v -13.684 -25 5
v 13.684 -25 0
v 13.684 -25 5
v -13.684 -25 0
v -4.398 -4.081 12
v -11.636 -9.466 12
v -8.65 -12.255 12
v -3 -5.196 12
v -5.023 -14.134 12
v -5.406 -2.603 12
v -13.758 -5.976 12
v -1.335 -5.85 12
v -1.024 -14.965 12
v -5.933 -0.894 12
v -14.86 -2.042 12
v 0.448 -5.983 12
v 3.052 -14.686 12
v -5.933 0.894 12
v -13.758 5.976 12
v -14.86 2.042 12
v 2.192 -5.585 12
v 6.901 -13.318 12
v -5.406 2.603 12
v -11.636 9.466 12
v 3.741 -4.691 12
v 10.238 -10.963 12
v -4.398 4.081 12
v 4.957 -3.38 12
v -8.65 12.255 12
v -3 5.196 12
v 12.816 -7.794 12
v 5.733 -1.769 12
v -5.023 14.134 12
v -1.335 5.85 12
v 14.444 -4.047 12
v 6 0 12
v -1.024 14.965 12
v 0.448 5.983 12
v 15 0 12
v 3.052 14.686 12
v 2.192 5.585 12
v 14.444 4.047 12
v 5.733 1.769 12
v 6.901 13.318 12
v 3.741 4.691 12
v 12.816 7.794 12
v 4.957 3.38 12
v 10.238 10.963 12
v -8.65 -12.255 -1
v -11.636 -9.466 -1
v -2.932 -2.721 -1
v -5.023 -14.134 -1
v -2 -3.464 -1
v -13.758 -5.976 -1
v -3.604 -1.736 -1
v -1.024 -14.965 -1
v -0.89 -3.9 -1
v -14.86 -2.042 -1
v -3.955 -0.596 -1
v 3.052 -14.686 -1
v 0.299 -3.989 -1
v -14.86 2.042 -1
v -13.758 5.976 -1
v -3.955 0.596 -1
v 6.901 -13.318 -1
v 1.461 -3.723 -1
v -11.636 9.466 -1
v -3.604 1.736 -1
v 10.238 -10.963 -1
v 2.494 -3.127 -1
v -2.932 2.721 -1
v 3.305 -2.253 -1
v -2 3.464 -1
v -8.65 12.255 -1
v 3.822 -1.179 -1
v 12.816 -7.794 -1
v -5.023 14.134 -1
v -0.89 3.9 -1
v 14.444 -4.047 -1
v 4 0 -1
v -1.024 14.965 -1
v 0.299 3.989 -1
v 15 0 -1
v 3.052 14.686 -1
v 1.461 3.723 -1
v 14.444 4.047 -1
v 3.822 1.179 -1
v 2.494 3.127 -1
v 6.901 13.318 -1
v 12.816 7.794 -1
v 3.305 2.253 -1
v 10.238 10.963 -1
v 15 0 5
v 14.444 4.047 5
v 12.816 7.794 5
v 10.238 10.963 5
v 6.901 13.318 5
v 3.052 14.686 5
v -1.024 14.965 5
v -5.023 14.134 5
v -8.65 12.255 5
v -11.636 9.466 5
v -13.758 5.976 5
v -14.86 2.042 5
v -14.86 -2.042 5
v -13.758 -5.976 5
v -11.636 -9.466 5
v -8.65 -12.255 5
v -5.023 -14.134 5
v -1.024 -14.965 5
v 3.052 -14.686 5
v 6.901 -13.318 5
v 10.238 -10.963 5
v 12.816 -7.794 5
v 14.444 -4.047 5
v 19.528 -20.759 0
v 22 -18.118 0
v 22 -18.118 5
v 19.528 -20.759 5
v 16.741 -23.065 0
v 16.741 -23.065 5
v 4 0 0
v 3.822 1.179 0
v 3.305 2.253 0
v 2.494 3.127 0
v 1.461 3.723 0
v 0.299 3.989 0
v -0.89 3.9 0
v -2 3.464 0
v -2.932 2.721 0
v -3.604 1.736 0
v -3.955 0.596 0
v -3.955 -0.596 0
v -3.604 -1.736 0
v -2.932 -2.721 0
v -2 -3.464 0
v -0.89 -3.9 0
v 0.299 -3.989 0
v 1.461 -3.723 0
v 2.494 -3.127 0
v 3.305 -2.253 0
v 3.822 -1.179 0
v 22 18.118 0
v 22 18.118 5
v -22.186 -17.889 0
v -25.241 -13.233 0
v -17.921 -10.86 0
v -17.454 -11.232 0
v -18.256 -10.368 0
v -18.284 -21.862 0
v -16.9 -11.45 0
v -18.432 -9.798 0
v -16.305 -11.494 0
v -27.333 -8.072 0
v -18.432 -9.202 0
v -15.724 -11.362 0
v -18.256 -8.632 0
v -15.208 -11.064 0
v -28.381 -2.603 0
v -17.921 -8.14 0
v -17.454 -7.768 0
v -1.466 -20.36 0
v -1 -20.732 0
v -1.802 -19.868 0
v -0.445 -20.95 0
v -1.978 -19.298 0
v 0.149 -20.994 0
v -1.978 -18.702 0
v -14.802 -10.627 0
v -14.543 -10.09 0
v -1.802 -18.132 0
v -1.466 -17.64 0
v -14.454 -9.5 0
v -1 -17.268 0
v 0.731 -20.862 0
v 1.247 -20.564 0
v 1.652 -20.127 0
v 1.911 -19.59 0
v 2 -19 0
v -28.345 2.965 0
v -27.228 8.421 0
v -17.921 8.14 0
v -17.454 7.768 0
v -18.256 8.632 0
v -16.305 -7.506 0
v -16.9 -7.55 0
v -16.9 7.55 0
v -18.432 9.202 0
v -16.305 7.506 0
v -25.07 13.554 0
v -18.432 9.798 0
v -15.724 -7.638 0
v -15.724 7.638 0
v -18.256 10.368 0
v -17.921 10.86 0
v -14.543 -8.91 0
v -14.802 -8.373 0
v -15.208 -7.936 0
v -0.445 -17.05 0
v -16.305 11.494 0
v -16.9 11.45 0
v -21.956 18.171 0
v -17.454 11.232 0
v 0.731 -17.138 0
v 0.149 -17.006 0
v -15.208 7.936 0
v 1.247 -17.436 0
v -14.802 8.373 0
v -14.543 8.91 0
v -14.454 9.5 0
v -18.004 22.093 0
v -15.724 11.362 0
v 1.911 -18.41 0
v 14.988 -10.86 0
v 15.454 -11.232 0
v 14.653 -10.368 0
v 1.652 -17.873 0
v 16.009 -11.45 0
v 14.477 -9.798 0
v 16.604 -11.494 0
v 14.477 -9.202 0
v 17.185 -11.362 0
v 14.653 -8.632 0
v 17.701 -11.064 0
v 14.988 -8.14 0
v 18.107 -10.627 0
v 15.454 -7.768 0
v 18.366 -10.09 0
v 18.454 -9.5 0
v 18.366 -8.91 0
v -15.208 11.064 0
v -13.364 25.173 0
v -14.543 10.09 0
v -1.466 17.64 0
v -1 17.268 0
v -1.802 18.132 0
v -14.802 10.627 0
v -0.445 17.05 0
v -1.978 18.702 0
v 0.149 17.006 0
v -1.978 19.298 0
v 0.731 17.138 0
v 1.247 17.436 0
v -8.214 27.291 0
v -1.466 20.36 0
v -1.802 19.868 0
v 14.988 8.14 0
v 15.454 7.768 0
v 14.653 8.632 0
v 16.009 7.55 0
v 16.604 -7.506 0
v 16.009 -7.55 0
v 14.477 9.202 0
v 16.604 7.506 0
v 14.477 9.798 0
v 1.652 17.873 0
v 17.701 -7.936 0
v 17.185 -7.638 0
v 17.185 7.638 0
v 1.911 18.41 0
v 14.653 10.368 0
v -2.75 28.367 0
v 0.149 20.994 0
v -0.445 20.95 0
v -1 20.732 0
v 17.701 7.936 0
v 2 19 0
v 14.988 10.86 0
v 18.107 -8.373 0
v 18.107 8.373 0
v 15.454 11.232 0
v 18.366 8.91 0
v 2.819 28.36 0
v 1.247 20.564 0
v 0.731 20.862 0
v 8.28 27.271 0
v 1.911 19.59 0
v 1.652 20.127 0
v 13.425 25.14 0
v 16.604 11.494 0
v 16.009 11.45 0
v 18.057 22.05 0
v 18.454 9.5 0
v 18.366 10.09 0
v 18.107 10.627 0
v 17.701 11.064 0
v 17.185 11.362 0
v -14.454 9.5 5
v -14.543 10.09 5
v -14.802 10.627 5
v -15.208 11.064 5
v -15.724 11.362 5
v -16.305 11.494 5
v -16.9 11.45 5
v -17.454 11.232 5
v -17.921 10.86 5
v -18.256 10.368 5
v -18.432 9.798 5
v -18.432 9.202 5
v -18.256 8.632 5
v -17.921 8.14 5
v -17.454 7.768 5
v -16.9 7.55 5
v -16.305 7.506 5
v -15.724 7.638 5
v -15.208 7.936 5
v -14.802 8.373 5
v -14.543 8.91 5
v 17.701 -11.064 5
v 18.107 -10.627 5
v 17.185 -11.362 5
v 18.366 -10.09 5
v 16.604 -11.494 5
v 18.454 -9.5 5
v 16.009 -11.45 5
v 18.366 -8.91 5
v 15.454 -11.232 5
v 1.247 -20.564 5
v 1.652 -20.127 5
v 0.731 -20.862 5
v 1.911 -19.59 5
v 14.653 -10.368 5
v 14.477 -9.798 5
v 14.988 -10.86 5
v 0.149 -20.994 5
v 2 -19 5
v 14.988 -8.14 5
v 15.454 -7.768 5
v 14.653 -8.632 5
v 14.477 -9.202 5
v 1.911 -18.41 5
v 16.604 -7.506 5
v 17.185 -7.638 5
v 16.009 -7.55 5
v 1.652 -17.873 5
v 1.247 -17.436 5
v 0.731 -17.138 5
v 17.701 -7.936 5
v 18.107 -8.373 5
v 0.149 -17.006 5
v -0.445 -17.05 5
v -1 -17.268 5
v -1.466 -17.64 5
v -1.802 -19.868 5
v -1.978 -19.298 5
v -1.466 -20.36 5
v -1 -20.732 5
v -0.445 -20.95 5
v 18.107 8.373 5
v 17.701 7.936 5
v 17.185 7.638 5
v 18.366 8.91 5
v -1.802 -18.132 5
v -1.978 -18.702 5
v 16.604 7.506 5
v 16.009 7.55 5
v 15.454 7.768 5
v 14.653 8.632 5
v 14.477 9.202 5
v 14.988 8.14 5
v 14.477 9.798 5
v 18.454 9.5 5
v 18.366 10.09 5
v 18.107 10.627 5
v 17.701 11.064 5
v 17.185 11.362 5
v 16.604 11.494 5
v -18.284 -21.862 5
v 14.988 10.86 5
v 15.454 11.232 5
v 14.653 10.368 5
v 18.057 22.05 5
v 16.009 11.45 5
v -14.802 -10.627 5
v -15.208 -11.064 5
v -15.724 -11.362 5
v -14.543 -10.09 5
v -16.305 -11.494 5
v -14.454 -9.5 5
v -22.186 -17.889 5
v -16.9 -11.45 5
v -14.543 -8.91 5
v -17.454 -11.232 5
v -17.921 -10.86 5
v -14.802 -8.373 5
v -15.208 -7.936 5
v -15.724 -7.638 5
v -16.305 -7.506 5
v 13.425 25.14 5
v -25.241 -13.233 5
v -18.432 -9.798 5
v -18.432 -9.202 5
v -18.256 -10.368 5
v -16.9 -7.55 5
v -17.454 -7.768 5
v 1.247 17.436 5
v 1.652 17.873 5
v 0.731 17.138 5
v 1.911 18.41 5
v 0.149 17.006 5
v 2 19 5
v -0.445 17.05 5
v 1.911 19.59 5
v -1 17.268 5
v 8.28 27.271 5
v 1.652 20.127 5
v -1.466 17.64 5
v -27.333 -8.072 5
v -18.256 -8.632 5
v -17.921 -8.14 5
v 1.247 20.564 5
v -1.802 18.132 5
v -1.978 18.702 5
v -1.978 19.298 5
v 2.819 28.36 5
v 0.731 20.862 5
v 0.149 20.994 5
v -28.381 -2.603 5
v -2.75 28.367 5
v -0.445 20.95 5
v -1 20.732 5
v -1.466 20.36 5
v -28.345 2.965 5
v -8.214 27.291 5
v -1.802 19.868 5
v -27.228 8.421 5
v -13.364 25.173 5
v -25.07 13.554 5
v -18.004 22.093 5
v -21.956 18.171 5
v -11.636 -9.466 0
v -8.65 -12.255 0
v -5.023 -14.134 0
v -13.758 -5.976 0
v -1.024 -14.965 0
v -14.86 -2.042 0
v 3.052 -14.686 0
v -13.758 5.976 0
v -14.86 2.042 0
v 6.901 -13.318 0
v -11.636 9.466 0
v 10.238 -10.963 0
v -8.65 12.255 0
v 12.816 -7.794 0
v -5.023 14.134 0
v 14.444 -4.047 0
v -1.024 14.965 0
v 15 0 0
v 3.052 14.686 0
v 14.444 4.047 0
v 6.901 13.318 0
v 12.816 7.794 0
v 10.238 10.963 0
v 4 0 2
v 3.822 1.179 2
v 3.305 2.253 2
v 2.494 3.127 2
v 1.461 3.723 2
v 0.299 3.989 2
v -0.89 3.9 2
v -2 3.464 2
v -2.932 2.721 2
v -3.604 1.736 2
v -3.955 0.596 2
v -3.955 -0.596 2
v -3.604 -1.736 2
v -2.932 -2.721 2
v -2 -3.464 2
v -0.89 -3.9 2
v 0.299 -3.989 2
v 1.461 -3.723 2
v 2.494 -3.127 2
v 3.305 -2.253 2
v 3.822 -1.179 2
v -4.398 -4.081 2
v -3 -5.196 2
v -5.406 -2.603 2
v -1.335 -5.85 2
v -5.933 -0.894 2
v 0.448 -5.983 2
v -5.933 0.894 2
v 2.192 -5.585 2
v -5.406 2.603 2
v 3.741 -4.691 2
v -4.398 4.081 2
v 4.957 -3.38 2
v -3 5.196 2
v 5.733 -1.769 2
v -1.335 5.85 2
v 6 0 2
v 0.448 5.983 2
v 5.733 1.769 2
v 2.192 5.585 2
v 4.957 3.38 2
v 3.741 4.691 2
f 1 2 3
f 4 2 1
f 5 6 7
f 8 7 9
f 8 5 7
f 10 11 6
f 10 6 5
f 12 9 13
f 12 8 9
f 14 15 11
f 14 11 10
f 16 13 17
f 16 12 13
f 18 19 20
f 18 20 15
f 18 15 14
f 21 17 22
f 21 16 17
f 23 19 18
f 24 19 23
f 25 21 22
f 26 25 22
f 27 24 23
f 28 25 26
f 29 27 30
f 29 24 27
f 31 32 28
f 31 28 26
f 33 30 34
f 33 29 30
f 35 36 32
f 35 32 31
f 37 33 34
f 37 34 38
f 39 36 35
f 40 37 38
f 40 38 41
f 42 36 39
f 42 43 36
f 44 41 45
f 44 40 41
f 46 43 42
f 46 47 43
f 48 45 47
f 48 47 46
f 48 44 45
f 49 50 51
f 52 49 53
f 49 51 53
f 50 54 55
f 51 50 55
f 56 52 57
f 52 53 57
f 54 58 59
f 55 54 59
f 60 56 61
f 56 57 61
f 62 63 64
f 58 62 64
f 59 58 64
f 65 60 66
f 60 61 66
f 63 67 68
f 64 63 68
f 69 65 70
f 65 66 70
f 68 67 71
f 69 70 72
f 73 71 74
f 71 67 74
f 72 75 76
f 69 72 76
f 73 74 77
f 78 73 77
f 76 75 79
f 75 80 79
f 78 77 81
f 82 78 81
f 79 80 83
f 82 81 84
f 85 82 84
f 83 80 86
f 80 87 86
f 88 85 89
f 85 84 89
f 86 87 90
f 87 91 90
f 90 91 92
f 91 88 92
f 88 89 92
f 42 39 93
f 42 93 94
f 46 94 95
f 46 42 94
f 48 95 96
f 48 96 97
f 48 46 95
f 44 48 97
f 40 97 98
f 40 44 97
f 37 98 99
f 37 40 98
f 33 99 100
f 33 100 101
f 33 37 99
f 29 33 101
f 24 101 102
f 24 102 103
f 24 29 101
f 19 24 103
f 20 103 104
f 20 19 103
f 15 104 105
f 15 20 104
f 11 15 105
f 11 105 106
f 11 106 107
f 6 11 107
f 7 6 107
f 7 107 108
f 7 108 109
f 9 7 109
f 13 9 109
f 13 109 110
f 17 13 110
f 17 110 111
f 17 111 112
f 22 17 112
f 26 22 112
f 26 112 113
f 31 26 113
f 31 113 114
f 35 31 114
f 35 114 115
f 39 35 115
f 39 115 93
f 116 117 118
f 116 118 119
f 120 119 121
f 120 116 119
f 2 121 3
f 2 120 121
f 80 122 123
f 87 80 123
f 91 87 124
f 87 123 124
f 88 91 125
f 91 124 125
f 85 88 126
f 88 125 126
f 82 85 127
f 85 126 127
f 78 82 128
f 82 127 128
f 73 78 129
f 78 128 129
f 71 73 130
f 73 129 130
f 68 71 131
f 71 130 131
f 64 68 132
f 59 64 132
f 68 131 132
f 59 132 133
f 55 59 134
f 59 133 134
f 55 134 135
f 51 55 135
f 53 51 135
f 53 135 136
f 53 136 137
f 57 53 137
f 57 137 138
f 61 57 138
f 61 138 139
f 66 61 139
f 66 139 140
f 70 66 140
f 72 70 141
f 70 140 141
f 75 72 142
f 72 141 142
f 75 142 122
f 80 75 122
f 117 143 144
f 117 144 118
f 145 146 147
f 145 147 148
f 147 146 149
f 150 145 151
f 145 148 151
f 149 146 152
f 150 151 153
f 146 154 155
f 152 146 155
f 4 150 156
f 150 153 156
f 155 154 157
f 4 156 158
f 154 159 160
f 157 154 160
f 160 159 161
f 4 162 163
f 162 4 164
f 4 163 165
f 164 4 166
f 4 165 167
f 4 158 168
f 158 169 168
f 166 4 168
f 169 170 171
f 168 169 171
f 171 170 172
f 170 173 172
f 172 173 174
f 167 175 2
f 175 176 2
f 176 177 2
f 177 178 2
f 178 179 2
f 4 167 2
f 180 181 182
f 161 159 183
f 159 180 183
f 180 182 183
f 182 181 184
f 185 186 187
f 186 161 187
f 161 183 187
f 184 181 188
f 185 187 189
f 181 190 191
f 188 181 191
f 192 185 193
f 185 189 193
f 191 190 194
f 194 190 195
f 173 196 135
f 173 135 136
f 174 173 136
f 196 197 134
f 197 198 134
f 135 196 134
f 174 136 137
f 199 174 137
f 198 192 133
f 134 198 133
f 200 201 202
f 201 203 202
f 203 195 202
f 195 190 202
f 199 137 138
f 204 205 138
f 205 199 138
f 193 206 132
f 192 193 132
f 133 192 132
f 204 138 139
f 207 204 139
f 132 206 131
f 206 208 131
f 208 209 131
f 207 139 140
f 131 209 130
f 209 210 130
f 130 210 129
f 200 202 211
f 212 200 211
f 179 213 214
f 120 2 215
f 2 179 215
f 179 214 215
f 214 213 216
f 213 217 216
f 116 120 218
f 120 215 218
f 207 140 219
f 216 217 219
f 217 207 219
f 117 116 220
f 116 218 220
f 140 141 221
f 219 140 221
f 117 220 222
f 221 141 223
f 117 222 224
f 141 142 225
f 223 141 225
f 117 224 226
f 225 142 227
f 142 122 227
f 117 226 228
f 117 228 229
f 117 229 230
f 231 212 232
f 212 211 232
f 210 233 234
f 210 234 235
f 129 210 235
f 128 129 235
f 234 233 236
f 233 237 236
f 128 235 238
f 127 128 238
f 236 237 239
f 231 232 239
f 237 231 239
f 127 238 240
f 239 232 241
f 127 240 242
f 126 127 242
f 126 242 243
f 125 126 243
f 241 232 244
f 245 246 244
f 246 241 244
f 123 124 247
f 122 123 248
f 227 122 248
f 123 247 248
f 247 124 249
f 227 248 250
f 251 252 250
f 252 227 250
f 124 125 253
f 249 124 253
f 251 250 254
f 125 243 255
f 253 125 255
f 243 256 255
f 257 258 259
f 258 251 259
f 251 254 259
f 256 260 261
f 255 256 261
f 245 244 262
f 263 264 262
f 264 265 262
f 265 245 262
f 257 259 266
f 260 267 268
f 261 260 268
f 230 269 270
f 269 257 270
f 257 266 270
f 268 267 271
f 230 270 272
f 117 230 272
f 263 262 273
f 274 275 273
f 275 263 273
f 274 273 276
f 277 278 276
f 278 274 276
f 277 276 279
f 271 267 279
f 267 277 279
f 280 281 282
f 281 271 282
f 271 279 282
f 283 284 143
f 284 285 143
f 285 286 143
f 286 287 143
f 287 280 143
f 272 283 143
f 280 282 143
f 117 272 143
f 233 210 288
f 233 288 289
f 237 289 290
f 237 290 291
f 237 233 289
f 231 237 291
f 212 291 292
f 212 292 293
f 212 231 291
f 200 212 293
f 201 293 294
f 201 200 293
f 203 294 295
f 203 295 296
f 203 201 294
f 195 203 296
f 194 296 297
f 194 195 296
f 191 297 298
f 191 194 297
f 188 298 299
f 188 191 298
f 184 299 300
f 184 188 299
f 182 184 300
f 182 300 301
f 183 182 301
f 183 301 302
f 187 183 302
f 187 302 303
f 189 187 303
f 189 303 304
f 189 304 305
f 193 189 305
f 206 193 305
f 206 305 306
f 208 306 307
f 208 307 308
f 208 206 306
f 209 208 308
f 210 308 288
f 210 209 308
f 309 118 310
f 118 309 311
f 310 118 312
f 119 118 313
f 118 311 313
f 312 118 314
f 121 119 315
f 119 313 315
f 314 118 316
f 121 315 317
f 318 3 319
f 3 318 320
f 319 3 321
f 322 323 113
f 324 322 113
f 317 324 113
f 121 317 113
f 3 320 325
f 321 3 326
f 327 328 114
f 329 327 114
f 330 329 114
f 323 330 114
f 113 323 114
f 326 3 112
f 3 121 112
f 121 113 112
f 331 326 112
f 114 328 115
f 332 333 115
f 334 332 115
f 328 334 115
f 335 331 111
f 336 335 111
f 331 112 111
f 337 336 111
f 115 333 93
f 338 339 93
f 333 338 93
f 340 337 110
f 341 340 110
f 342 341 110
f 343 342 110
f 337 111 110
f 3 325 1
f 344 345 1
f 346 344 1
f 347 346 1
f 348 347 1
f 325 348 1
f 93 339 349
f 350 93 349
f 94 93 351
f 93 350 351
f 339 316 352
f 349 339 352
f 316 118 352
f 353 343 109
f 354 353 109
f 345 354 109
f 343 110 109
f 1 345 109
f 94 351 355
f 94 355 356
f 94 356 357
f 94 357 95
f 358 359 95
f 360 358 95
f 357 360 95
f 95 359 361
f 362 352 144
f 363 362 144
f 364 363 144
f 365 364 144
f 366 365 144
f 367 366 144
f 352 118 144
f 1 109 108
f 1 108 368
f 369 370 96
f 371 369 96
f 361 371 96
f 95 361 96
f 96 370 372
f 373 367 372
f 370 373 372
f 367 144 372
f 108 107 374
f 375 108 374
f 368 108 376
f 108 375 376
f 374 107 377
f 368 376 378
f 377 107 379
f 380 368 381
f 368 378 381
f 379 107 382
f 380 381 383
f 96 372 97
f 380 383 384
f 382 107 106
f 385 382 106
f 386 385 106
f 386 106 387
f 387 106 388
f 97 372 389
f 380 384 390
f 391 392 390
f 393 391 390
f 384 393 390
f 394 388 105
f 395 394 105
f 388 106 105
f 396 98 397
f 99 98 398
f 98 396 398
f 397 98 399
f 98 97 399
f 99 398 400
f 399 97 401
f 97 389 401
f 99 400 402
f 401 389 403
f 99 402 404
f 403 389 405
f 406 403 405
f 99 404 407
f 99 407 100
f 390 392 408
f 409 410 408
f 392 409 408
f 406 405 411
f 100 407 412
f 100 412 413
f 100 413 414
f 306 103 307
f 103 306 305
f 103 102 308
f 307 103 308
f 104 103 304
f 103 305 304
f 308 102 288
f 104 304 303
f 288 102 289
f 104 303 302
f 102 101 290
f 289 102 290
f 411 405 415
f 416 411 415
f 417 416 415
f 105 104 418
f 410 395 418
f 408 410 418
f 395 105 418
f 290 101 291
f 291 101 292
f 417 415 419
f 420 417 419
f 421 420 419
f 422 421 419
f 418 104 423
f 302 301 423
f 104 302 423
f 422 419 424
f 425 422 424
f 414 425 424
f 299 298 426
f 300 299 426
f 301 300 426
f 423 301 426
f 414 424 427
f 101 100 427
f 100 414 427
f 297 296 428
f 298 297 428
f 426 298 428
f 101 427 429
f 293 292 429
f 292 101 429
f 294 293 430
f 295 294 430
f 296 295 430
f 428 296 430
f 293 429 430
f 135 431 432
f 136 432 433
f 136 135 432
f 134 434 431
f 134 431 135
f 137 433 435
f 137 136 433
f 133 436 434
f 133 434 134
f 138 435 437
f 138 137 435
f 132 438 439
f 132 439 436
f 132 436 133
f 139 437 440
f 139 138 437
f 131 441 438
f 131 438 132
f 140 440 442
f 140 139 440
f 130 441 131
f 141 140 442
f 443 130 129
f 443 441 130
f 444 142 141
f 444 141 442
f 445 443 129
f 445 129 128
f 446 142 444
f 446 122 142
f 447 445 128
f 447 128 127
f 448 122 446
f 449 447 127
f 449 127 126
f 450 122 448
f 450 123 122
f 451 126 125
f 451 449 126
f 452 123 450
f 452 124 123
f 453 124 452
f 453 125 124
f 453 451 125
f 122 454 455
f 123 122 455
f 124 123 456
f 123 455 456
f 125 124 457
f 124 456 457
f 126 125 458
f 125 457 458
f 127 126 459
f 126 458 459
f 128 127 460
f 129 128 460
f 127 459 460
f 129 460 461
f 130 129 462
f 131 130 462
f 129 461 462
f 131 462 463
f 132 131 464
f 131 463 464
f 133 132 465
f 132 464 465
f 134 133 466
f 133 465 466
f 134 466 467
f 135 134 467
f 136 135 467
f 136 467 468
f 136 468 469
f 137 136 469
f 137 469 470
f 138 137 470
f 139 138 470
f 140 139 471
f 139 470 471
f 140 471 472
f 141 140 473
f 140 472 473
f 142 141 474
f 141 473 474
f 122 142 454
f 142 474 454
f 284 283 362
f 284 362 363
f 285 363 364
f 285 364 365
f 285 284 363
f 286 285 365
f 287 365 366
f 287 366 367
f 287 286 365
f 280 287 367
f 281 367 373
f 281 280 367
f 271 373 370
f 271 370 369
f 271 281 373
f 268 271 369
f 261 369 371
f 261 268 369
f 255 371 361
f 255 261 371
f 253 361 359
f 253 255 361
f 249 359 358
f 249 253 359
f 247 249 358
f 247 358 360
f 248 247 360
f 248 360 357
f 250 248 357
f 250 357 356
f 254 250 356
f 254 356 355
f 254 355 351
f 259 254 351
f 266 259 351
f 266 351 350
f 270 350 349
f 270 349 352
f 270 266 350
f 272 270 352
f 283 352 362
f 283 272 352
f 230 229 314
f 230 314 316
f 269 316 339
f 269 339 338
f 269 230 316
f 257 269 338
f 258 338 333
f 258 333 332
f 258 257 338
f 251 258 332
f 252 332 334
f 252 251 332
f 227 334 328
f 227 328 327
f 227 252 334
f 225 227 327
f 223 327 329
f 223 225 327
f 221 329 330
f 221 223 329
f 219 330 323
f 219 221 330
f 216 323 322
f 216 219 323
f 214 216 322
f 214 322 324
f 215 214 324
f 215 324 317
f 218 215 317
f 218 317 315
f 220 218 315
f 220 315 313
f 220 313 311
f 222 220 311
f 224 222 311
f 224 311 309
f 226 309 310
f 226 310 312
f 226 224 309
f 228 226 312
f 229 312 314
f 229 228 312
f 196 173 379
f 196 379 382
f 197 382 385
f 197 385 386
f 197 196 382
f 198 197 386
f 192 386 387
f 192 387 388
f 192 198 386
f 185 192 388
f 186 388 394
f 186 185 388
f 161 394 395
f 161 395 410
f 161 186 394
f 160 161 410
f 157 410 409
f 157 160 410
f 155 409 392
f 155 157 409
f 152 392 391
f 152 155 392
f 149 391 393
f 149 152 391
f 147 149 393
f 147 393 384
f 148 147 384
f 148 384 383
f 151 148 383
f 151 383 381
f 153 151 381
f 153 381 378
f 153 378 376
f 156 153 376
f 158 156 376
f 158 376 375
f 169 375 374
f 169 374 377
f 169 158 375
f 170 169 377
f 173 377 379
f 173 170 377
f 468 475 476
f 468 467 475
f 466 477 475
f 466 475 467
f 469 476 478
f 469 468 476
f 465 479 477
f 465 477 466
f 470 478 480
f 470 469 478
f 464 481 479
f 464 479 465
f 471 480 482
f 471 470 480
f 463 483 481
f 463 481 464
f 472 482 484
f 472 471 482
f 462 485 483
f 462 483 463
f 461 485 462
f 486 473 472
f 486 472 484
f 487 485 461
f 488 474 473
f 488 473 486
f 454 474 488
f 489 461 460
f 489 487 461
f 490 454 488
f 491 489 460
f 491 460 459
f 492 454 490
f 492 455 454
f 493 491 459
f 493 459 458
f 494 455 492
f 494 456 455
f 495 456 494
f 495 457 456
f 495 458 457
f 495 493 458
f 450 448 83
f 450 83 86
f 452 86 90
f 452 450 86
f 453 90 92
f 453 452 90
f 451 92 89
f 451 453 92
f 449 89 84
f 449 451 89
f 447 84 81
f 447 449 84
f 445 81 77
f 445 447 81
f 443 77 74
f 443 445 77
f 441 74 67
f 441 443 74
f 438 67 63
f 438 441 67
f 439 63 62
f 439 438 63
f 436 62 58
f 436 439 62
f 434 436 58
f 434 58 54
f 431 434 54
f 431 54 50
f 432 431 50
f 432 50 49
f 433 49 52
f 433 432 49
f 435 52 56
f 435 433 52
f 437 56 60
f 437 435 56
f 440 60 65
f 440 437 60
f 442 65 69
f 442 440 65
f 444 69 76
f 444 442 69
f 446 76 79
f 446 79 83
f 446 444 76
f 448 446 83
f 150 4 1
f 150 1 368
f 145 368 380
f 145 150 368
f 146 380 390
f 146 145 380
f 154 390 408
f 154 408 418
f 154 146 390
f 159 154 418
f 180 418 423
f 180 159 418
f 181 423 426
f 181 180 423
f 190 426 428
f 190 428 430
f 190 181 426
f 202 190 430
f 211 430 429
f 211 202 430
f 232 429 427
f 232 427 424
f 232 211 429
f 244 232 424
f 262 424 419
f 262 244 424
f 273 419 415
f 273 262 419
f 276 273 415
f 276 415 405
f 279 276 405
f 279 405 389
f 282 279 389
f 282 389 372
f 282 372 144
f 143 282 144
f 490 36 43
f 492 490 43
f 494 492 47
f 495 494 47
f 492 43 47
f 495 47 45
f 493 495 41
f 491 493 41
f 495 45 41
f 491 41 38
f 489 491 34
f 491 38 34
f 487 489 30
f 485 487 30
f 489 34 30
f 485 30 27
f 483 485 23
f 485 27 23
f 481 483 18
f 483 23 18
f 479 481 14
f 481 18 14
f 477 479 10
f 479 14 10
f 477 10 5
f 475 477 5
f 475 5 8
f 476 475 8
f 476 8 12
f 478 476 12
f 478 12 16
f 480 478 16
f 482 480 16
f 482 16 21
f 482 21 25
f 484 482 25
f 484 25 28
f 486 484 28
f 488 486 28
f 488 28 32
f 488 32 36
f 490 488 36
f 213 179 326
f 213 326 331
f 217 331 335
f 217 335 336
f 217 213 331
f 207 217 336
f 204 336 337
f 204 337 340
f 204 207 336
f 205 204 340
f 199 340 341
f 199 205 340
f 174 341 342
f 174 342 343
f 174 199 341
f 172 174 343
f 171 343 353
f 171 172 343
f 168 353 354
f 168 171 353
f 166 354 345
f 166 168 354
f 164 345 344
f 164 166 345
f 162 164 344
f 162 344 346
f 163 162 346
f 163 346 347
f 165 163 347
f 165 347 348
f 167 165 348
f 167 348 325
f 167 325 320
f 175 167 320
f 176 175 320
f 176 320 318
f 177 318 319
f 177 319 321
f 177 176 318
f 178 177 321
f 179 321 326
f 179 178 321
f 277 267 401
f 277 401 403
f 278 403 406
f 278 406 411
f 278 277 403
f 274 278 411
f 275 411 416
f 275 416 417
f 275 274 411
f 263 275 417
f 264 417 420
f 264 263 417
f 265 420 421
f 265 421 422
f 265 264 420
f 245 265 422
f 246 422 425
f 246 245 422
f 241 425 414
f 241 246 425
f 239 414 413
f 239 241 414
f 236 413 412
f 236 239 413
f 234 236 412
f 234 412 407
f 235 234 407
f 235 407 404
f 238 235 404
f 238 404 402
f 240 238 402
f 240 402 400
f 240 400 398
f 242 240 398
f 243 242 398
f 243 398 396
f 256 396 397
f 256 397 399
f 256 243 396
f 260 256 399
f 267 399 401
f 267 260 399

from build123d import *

# Parameters (mm, degrees)
SKETCH1_R           = 15
SKETCH1_R_2         = 4
BOSS_EXTRUDE1_DEPTH = 1
SKETCH1_4_R         = 2
SKETCH1_4_R_2       = 15
BOSS_EXTRUDE2_DEPTH = 5
BOSS_EXTRUDE3_START = 12
SKETCH1_6_R         = 15
SKETCH1_6_R_2       = 6
BOSS_EXTRUDE3_DEPTH = 12
BOSS_EXTRUDE4_START = 2
SKETCH1_7_R         = 6
SKETCH1_7_R_2       = 4
BOSS_EXTRUDE4_DEPTH = 2


with BuildPart() as part:
    # Sketch1 → Boss-Extrude1 (new body)
    with BuildSketch(Plane.XY):
        Circle(SKETCH1_R)
        Circle(SKETCH1_R_2, mode=Mode.SUBTRACT)
    extrude(amount=-BOSS_EXTRUDE1_DEPTH)


with BuildPart() as body_2:
    # Sketch1<4> → Boss-Extrude2 (new body)
    with BuildSketch(Plane.XY):
        with BuildLine():
            Line((22, -18.117670932), (22, 18.117670932))
            ThreePointArc((22, 18.117670932), (-21.956152501, 18.170783345), (-13.683932183, -25))
            Line((-13.683932183, -25), (13.683932183, -25))
            ThreePointArc((13.683932183, -25), (18.170783345, -21.956152501), (22, -18.117670932))
        make_face()
        with Locations((-16.454482672, -9.5)):
            Circle(SKETCH1_4_R, mode=Mode.SUBTRACT)
        with Locations((0, -19)):
            Circle(SKETCH1_4_R, mode=Mode.SUBTRACT)
        Circle(SKETCH1_4_R_2, mode=Mode.SUBTRACT)
        with Locations((16.454482672, -9.5)):
            Circle(SKETCH1_4_R, mode=Mode.SUBTRACT)
        with Locations((-16.454482672, 9.5)):
            Circle(SKETCH1_4_R, mode=Mode.SUBTRACT)
        with Locations((16.454482672, 9.5)):
            Circle(SKETCH1_4_R, mode=Mode.SUBTRACT)
        with Locations((0, 19)):
            Circle(SKETCH1_4_R, mode=Mode.SUBTRACT)
    extrude(amount=BOSS_EXTRUDE2_DEPTH)

    # Sketch1<6> → Boss-Extrude3 (add)
    with BuildSketch(Plane.XY.offset(BOSS_EXTRUDE3_START)):
        Circle(SKETCH1_6_R)
        Circle(SKETCH1_6_R_2, mode=Mode.SUBTRACT)
    extrude(amount=-BOSS_EXTRUDE3_DEPTH)

    # Sketch1<7> → Boss-Extrude4 (add)
    with BuildSketch(Plane.XY.offset(BOSS_EXTRUDE4_START)):
        Circle(SKETCH1_7_R)
        Circle(SKETCH1_7_R_2, mode=Mode.SUBTRACT)
    extrude(amount=-BOSS_EXTRUDE4_DEPTH)


solid = Compound([part.part, body_2.part])
